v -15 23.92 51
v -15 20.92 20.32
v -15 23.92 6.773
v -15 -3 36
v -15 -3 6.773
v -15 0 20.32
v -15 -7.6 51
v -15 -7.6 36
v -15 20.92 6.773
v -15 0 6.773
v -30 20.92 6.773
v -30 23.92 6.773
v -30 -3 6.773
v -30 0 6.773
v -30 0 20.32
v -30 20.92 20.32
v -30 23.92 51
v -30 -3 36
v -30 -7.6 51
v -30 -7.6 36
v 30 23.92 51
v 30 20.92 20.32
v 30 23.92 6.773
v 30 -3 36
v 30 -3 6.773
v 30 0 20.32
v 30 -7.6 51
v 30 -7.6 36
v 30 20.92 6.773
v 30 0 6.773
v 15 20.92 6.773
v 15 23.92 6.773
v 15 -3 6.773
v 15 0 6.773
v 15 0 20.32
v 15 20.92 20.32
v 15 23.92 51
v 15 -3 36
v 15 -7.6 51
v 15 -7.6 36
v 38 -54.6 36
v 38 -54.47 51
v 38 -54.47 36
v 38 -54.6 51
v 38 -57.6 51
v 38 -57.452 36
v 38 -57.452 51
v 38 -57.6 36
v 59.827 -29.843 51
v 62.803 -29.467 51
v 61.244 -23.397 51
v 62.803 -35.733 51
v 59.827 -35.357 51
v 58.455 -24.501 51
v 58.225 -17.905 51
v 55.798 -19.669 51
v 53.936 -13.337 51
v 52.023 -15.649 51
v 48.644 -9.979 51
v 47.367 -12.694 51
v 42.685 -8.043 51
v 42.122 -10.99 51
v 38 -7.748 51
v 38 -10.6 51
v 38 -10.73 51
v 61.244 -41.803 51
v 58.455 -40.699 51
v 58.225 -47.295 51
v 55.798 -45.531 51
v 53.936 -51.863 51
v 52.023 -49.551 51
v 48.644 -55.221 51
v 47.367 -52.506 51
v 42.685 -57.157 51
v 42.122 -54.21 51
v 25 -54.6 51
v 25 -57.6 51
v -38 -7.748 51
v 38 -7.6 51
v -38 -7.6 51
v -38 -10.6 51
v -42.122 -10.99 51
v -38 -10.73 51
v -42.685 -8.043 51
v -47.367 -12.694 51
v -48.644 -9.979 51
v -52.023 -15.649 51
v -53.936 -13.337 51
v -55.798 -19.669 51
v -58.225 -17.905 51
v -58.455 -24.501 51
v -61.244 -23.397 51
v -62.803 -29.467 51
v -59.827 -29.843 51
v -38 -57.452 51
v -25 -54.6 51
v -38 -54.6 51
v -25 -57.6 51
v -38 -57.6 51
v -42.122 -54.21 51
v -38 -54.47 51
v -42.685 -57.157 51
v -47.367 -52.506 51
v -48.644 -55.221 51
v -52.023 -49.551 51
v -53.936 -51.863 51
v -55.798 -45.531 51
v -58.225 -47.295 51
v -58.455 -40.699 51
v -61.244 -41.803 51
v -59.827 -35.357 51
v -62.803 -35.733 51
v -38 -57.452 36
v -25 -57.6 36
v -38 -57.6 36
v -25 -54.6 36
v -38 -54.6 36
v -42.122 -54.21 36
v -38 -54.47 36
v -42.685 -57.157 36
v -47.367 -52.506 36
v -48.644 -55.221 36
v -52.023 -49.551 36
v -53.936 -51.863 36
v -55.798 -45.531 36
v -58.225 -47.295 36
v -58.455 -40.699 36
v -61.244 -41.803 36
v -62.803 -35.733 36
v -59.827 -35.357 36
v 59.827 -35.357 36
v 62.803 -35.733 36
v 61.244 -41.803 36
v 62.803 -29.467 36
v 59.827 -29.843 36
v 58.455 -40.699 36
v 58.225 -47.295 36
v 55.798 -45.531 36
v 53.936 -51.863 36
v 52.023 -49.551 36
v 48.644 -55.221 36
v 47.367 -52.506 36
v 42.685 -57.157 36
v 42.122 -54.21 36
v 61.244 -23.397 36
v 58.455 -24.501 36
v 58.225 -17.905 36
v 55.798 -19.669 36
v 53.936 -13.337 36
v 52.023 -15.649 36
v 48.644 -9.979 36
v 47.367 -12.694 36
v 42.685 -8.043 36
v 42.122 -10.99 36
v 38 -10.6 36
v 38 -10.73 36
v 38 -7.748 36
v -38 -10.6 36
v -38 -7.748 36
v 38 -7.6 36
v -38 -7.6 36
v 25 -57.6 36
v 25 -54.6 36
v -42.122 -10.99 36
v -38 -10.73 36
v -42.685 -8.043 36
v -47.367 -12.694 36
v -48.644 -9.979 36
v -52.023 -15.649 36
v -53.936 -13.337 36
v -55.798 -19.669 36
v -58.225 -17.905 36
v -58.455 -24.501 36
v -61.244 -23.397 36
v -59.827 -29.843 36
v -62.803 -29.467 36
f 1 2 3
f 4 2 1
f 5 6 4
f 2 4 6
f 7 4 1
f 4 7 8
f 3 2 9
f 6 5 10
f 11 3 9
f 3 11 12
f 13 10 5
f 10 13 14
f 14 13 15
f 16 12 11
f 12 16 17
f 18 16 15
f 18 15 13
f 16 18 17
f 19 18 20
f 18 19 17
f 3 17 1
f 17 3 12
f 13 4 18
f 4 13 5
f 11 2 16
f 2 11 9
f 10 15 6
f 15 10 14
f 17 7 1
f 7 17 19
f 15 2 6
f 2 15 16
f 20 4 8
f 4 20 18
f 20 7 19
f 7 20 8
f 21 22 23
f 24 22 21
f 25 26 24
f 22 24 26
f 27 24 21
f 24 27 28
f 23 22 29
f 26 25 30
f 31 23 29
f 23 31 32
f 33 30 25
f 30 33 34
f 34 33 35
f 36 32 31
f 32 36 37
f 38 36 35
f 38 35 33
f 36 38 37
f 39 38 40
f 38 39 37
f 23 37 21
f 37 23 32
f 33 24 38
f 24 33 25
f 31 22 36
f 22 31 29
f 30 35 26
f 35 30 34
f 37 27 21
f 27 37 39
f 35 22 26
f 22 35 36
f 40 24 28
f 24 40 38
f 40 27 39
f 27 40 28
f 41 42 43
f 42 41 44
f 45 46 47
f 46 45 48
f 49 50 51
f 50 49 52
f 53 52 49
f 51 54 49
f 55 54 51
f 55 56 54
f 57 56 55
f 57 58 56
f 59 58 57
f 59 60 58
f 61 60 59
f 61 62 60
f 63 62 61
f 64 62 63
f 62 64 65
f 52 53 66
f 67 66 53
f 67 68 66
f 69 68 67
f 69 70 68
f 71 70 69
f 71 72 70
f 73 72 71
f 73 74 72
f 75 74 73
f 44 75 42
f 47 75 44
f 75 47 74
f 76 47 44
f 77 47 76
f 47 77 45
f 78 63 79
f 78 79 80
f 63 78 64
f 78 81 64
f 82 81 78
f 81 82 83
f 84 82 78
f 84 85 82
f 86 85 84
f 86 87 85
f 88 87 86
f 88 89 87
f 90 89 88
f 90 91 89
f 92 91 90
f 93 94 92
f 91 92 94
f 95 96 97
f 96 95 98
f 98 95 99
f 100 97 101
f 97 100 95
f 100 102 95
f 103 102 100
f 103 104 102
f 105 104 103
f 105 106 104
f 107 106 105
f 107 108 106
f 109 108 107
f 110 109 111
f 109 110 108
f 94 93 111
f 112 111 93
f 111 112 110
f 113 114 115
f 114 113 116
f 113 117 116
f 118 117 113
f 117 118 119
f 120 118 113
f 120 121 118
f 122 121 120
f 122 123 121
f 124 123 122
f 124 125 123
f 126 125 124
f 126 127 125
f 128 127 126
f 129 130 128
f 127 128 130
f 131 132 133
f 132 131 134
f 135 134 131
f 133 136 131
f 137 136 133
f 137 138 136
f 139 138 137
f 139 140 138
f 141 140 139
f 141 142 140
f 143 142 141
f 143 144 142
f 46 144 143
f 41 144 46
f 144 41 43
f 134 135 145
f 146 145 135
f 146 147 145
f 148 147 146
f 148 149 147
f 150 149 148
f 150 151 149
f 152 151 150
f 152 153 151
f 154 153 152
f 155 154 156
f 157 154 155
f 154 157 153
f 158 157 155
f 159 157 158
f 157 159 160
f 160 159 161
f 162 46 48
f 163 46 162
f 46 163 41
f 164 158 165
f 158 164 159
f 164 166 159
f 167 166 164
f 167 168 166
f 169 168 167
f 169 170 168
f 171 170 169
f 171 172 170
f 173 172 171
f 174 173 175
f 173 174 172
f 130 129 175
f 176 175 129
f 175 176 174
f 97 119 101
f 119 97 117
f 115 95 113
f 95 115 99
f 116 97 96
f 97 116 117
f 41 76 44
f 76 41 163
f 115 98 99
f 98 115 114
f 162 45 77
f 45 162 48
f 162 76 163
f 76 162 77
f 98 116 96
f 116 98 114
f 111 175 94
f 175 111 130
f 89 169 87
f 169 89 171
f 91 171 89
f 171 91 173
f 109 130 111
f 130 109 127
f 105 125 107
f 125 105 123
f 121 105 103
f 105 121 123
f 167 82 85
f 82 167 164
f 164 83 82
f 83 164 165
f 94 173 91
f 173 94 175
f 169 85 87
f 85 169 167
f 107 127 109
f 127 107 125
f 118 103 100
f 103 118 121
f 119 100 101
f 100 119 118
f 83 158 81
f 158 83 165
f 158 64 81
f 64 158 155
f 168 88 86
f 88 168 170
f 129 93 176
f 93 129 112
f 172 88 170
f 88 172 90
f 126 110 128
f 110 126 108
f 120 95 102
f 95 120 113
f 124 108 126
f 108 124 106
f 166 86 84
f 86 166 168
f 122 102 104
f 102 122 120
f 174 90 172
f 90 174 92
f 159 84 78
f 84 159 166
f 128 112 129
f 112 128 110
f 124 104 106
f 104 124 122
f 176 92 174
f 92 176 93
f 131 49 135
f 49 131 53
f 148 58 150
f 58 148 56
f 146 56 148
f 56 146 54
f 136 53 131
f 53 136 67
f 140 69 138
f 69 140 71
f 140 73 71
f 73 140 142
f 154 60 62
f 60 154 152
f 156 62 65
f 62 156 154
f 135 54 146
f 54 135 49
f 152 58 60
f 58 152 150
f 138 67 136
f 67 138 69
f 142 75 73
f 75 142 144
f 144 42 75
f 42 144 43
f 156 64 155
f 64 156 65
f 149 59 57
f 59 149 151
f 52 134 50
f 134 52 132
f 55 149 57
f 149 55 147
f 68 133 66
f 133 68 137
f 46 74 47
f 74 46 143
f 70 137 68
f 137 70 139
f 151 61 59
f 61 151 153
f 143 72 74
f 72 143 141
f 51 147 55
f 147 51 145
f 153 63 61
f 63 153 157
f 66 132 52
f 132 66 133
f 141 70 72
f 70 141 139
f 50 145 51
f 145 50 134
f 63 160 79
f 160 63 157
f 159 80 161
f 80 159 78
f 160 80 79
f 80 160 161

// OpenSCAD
/* Based on https://www.thingiverse.com/thing:468828 by zeus
 * (https://www.thingiverse.com/zeus/designs) under the Creative Commons -
 * Attribution - Non-Commercial - Share Alike License.
 *
 * This work shares the license of the original.
 */

// roomba dock mount
// some base measures of the original charger:
// overall width: 132mm
// effective upper width: 118.5mm
// effective upper depth: 44mm
// offset to wall: ~8mm

$fn=25;
measured_w=118.5;
measured_d=44;
bracket_h=15;
bracket_gap=50;
charger_d=measured_d;
material_t=3;
bracket_spacing=1.5;
helper_w=measured_w-charger_d+bracket_spacing;

//-------------------------------------------------------------------------


module dock_mount_side(thickness){
  cube([helper_w,thickness,bracket_h],center=true);
}

module gap_side(thickness){
  difference(){
    cube([helper_w,thickness,bracket_h],center=true);
    cube([bracket_gap,thickness,bracket_h],center=true);
  }
}

module clamp(thickness){
  difference(){
    cylinder(h=bracket_h,r=charger_d/2+thickness,center=true);
    union(){
      cylinder(h=bracket_h,r=charger_d/2,center=true);
      translate([0,-charger_d/2-thickness,-bracket_h/2]){
        cube([charger_d/2+thickness,charger_d+thickness,bracket_h]);
      }
    }
  }
}

module roomba_clamp(thickness) {
  dock_mount_side(thickness);

  translate([0,-charger_d-thickness,0]){
    gap_side(thickness);
  }


  translate([-helper_w/2,-charger_d/2-thickness/2,0]){
    clamp(thickness); //left
  }

  translate([helper_w/2,-charger_d/2-thickness/2,0]){
    mirror([1,0,0]){
      clamp(thickness); //right
    }
  }
}

module bar_clamp(length, bar_size, thickness, clamp_depth_ratio) {
  translate([-length/2, 0, 0])
    difference() {
      translate([0, -thickness, bar_size * (1 - clamp_depth_ratio)])
        cube([length, bar_size + $tolerance + 2 * thickness, (bar_size + $tolerance) * clamp_depth_ratio + thickness]);
      cube([length, bar_size + $tolerance, bar_size + $tolerance/2]);
    }
}

module base_to_bar_adapter(
  bar_clamp_length,
  bar_size,
  thickness,
  clamp_depth_ratio,
  bar_clamp_separation,
  plug_clearance_height, // This needs to include the relative depression of the carpet
  flair_clearance
) {
  for (i = [-1,1]) {
    translate([i * (bar_clamp_separation + bar_clamp_length)/2, 0, 0]) {
      translate([-bar_clamp_length/2, -thickness, bar_size])
        cube([bar_clamp_length, bar_size + thickness*2 + $tolerance, plug_clearance_height + bracket_h - bar_size]);
      translate([-bar_clamp_length/2, -flair_clearance - $tolerance, plug_clearance_height])
        cube([bar_clamp_length, flair_clearance + $tolerance, bracket_h]);
      bar_clamp(bar_clamp_length, bar_size, thickness, clamp_depth_ratio);
    }
  }

  translate([0,-thickness/2 - flair_clearance - $tolerance, plug_clearance_height + bracket_h/2])
    roomba_clamp(thickness);
}

base_to_bar_adapter(15, 20.32, 3, 2/3, 30, 36, 7, $tolerance = 0.6);
